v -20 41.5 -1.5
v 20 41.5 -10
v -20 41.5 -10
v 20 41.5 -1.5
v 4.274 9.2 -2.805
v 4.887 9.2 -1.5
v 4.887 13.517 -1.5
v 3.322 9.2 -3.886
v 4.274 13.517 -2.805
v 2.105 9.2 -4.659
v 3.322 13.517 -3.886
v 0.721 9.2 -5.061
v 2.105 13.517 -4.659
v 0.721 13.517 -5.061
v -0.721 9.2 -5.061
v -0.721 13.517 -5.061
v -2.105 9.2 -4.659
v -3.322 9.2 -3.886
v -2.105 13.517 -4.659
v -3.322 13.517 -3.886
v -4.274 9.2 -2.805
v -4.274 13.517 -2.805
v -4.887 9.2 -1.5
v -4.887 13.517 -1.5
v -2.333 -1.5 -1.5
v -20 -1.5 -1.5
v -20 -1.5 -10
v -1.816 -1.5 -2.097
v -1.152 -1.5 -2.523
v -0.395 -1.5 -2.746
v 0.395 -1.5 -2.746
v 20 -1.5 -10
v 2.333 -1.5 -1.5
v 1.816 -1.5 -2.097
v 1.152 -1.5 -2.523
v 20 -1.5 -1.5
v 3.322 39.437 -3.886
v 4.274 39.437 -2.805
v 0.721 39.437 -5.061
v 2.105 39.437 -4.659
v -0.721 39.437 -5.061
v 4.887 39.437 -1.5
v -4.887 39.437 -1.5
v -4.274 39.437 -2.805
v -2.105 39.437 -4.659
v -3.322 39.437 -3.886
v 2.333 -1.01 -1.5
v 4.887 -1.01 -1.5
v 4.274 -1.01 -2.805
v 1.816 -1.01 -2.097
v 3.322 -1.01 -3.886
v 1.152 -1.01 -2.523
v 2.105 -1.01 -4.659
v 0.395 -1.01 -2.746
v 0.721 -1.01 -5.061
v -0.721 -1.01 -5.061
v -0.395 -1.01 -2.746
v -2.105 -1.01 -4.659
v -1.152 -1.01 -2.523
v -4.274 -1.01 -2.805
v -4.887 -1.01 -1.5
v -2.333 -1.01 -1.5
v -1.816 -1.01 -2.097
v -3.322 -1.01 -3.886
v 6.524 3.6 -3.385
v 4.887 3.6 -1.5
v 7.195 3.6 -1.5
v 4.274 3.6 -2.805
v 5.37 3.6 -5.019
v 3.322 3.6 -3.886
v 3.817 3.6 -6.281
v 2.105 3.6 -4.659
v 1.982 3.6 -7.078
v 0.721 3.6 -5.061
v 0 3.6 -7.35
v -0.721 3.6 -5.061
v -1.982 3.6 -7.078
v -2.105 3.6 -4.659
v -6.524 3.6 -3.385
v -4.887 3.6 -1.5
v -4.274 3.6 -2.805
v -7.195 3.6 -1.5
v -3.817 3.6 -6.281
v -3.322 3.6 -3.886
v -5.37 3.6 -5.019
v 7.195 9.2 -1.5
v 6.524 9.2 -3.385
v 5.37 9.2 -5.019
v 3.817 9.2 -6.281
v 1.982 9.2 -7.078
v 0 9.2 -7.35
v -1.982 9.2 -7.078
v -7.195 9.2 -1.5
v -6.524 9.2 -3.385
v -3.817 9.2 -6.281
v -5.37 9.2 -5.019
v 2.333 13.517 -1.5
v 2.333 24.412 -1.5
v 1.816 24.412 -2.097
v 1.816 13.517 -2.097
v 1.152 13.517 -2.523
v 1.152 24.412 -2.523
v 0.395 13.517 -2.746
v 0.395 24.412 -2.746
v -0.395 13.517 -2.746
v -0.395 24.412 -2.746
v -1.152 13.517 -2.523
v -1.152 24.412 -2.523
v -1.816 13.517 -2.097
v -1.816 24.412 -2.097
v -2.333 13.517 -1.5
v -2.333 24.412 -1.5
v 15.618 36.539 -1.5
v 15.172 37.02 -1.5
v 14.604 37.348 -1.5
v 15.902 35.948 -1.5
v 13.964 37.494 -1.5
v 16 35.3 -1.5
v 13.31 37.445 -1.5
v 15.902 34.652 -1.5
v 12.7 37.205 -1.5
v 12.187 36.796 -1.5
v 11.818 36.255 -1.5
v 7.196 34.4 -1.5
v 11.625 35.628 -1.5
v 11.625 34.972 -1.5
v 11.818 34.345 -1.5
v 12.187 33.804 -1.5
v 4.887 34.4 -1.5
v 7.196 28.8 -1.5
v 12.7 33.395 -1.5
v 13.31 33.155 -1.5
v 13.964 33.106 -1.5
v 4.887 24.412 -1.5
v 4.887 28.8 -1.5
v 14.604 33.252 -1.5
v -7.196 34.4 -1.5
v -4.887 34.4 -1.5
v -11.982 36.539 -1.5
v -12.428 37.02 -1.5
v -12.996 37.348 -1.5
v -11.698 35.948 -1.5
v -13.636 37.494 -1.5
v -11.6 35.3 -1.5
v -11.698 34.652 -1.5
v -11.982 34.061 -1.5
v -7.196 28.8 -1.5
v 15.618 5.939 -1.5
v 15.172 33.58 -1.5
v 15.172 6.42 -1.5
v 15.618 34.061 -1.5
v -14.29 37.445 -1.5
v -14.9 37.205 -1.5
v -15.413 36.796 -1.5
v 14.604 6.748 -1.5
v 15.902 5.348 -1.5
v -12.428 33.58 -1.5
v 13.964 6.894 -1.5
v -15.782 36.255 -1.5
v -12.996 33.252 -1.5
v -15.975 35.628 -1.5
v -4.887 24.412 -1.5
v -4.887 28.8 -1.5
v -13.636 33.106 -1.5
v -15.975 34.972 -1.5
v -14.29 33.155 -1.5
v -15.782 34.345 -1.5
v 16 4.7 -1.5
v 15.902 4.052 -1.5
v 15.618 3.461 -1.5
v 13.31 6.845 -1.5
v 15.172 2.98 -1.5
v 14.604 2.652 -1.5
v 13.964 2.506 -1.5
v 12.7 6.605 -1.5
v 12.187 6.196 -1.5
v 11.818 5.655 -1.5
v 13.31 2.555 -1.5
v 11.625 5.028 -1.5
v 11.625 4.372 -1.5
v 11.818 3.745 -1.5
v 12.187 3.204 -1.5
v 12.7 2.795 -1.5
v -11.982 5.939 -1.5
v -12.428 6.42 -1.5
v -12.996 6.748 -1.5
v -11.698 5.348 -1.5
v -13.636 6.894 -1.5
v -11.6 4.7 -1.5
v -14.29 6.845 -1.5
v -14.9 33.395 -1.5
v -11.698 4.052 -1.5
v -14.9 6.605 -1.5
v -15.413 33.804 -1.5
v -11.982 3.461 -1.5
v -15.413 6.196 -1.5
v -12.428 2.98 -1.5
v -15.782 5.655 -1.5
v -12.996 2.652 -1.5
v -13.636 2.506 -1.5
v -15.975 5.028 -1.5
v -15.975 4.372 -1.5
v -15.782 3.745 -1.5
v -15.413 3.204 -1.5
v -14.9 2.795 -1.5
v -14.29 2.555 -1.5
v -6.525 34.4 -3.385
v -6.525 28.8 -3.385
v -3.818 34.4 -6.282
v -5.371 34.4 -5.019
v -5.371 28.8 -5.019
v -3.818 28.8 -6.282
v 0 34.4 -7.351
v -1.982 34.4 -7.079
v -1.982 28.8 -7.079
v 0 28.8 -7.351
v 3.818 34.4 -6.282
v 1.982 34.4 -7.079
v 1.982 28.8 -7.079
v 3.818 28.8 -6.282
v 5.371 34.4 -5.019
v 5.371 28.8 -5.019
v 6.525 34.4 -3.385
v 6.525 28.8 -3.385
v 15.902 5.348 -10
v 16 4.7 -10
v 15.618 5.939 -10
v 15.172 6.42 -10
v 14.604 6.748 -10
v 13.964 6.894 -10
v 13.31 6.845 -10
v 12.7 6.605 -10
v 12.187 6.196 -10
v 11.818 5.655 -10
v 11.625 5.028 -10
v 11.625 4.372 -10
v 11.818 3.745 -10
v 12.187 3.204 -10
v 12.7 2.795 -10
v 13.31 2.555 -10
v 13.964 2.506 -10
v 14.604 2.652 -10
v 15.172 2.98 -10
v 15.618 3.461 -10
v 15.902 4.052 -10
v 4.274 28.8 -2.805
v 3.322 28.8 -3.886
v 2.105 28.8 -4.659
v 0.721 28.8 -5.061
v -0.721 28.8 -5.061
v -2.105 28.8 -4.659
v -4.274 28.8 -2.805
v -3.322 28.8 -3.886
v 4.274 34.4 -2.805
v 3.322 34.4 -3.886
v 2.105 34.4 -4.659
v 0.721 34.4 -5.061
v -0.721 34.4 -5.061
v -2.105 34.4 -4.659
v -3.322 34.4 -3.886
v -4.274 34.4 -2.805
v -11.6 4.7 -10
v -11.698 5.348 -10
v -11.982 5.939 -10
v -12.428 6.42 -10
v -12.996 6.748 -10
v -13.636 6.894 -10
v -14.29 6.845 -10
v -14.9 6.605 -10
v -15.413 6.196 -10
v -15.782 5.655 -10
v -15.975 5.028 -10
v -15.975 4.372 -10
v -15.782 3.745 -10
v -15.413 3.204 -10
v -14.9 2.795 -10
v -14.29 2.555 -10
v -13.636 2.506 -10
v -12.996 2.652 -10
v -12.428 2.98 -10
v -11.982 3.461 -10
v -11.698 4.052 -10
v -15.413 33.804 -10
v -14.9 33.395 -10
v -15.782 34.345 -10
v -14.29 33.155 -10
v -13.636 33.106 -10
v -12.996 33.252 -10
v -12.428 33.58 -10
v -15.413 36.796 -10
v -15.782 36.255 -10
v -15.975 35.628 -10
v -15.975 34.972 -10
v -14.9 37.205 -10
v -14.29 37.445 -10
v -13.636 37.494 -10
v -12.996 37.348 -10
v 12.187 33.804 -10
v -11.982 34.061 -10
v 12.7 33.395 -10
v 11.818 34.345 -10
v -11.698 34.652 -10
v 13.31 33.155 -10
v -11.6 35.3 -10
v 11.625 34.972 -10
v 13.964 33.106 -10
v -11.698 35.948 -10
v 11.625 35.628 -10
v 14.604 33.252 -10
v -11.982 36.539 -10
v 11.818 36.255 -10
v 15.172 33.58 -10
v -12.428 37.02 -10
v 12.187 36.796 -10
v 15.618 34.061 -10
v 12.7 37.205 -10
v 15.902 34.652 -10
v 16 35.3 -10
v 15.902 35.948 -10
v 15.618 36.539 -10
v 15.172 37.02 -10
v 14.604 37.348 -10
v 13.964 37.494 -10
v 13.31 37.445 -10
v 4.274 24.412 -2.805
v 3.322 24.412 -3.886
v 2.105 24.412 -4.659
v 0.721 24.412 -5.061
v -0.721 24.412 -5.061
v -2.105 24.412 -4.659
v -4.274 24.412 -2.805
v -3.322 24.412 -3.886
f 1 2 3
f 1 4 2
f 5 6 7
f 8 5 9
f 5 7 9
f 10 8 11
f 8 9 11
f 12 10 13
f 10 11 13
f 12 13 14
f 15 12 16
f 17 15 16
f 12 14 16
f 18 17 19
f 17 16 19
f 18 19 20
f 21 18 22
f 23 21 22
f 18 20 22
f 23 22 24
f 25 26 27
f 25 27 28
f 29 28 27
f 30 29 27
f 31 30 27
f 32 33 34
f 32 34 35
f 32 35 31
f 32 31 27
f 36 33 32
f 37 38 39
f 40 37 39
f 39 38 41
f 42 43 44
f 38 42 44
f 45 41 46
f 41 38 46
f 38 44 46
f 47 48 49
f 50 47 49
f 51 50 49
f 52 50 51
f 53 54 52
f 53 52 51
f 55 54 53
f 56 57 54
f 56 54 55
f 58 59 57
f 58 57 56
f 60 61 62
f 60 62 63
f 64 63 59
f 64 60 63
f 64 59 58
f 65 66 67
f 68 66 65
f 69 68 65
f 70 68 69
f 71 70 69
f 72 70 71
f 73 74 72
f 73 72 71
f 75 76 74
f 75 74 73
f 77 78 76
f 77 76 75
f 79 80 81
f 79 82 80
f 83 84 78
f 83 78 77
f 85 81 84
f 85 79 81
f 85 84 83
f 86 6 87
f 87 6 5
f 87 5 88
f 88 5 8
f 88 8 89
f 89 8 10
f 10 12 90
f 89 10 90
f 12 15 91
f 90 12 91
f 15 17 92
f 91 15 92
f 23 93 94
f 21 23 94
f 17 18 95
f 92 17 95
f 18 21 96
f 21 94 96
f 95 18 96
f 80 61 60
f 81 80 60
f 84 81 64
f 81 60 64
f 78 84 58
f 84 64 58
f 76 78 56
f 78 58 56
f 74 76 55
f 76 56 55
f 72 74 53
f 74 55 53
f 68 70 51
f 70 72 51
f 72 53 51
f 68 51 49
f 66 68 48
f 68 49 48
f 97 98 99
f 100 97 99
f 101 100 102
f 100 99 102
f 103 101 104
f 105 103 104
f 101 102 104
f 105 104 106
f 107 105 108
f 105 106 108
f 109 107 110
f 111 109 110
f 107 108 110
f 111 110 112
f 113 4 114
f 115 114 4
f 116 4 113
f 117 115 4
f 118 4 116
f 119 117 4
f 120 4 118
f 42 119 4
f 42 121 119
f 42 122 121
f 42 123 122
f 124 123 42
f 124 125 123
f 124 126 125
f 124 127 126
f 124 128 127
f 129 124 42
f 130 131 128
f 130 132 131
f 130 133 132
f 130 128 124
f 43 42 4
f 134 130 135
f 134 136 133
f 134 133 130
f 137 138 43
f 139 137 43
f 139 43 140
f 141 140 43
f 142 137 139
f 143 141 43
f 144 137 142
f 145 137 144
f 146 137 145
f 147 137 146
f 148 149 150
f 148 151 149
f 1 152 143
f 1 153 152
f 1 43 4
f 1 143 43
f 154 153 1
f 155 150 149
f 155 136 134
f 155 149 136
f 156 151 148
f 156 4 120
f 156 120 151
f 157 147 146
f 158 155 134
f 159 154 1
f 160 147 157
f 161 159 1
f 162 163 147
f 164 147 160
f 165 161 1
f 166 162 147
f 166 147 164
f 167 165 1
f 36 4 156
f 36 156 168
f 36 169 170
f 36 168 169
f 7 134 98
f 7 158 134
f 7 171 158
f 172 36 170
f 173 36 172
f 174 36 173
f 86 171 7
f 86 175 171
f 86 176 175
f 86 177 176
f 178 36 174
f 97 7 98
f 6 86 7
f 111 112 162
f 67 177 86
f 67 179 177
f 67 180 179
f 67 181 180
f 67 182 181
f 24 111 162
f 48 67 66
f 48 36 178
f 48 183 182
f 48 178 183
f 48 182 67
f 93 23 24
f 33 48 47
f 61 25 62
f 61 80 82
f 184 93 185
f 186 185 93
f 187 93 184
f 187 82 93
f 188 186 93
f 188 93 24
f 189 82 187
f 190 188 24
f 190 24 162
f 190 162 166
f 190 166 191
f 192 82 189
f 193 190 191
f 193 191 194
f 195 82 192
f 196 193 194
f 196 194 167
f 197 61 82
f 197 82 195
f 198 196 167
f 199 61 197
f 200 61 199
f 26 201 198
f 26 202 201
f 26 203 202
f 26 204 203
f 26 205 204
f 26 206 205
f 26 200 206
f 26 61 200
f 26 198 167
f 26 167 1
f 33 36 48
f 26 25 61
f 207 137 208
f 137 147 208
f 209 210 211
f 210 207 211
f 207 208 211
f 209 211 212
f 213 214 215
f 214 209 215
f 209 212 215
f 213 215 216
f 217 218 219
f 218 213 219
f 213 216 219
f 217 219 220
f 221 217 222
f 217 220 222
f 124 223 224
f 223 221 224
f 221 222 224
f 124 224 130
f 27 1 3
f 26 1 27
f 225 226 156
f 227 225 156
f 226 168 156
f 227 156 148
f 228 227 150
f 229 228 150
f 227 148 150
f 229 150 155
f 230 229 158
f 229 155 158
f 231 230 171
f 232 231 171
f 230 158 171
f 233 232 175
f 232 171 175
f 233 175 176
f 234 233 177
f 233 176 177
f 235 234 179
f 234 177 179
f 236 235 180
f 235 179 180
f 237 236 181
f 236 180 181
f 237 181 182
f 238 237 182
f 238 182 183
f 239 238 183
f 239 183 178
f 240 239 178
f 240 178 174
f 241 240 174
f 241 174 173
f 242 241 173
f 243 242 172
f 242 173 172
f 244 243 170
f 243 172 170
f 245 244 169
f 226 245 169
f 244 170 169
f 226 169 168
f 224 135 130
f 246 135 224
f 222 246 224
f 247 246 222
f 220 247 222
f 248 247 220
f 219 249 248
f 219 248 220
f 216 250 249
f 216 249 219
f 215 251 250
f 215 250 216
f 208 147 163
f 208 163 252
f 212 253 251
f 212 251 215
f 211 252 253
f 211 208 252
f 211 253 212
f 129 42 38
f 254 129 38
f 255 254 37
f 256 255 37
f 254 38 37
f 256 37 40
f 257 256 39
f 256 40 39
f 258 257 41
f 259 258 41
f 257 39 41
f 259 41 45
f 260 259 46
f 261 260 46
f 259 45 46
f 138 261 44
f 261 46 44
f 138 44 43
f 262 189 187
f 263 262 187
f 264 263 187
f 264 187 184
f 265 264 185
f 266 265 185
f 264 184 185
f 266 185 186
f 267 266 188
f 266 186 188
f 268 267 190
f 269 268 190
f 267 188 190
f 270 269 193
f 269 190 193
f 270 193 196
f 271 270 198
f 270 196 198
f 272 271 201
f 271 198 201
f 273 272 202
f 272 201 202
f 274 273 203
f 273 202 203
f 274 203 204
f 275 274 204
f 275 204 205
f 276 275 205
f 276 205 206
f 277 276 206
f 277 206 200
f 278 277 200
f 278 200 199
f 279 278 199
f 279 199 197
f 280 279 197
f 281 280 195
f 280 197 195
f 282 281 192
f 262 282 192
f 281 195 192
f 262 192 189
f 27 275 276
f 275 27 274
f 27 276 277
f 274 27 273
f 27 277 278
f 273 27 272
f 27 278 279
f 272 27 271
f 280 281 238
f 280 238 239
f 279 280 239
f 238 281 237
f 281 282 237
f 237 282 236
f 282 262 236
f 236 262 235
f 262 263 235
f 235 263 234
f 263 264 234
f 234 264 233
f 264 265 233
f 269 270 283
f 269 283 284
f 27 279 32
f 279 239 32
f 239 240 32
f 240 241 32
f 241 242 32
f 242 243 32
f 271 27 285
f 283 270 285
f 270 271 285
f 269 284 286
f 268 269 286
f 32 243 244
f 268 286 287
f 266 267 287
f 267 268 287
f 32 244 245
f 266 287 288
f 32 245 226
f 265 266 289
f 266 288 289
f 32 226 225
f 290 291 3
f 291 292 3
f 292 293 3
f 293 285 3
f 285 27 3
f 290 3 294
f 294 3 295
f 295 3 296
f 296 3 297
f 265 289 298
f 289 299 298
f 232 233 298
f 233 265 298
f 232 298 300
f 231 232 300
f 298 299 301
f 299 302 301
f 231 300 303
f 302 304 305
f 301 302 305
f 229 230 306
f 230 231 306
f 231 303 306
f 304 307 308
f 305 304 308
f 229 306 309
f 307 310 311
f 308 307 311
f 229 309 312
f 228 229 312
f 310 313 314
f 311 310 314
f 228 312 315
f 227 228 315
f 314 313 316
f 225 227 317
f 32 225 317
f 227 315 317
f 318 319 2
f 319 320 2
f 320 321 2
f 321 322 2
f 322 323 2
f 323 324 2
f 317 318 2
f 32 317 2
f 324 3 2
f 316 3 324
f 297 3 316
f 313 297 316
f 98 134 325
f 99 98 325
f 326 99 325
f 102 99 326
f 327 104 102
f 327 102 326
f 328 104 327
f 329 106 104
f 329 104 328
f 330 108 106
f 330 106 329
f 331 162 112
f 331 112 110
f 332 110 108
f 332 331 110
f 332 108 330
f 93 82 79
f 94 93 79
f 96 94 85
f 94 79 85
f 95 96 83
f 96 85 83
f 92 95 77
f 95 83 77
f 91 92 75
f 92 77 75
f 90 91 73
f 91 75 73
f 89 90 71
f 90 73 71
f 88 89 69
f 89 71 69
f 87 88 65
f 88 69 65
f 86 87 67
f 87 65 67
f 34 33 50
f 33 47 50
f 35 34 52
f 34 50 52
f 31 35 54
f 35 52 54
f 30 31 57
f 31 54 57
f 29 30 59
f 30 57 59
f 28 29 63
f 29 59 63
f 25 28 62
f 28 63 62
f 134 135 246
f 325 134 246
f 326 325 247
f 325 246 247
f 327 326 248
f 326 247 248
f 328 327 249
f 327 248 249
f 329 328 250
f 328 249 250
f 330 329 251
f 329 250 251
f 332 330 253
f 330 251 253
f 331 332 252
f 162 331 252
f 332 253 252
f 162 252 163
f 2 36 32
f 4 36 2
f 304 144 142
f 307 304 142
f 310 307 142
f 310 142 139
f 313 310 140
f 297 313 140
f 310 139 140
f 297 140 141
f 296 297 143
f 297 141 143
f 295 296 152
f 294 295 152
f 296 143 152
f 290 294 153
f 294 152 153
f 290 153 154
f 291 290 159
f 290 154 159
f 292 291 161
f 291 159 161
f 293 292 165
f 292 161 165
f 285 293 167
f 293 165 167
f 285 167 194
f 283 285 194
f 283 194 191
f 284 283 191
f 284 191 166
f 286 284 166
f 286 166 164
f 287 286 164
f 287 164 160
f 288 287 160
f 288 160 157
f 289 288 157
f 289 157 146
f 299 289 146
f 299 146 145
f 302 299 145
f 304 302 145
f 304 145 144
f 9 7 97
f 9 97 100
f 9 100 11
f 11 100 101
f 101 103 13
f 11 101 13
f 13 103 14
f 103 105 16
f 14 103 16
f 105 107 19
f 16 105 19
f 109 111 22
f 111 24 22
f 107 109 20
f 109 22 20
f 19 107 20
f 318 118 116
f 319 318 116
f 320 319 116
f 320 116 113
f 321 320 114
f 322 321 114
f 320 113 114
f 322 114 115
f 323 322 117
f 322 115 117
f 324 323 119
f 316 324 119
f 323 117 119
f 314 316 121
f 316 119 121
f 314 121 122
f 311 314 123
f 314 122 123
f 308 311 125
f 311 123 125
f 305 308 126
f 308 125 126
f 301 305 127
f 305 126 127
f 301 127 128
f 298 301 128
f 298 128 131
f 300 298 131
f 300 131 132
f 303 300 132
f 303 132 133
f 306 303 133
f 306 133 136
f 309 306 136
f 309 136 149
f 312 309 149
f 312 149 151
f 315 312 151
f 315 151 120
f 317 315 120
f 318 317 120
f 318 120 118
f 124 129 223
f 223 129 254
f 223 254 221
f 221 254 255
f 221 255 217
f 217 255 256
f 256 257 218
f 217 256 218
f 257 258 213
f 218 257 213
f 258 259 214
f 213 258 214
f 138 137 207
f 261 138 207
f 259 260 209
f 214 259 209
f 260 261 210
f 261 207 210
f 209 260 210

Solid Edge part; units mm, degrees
sketch "Sketch1" plane through (0, 0, 0) normal (0, 0, 1) x (1, 0, 0)
  circle A0 centre (-13.8, 35.3) radius 2.2
  circle A1 centre (-13.8, 4.7) radius 2.2
  circle A2 centre (13.8, 4.7) radius 2.2
  circle A3 centre (13.8, 35.3) radius 2.2
  line L0 (-20, -1.5) -> (20, -1.5)
  line L1 (20, -1.5) -> (20, 41.5)
  line L2 (20, 41.5) -> (-20, 41.5)
  line L3 (-20, 41.5) -> (-20, -1.5)
  dimension "D1" = 43
  dimension "D2" = 40
  dimension "D3" = 20
  dimension "D4" = 4
  dimension "D5" = 4.4
  dimension "D6" = 4
  dimension "D7" = 4
  dimension "D8" = 29.8
  dimension "D9" = 4
extrude "Protrusion1" add sketch "Sketch1" against normal blind 10
sketch "Sketch2" plane through (0, 0, 0) normal (1, 0, 0) x (0, 1, 0)
  line L0 (3.9, -7.35) -> (8.9, -7.35)
  line L1 (3.9, -7.35) -> (3.6, -7.35)
  line L2 (3.6, -7.35) -> (3.6, -5.1123)
  line L3 (2.721, -5.1123) -> (3.6, -5.1123)
  line L4 (2.721, -5.1123) -> (-1.0103, -5.1123)
  line L5 (-1.0103, -5.1123) -> (-1.0103, -3.9681)
  line L6 (-1.0103, -2.774) -> (-1.0103, -3.9681)
  line L7 (-12.5526, -2.774) -> (-1.0103, -2.774)
  line L8 (-12.5526, 0) -> (-12.5526, -2.774)
  line L9 (39.4373, 0) -> (-12.5526, 0)
  line L10 (39.4373, -5.1123) -> (39.4373, 0)
  line L11 (38.3428, -5.1123) -> (39.4373, -5.1123)
  line L12 (34.6612, -5.1123) -> (38.3428, -5.1123)
  line L13 (34.4, -5.1123) -> (34.6612, -5.1123)
  line L14 (34.4, -7.3511) -> (34.4, -5.1123)
  line L15 (29.1, -7.3511) -> (34.4, -7.3511)
  line L16 (29.1, -7.3511) -> (28.8, -7.3511)
  line L17 (28.8, -7.3511) -> (28.8, -5.1123)
  line L18 (24.4125, -5.1123) -> (28.8, -5.1123)
  line L19 (24.4125, -2.774) -> (24.4125, -5.1123)
  line L20 (13.517, -2.774) -> (24.4125, -2.774)
  line L21 (13.517, -5.1123) -> (13.517, -2.774)
  line L22 (10.0842, -5.1123) -> (13.517, -5.1123)
  line L23 (9.2, -5.1123) -> (10.0842, -5.1123)
  line L24 (9.2, -7.35) -> (9.2, -5.1123)
  line L25 (8.9, -7.35) -> (9.2, -7.35)
  dimension "D1" = 5
  dimension "D2" = 0.3
  dimension "D3" = 0.3
  dimension "D4" = 0.3
  dimension "D5" = 0.3
  dimension "D6" = 7.3511
  dimension "D7" = 7.35
revolve "RevolvedCutout1" cut sketch "Sketch2" angle 360 about axis through (0, -60, 0) along (0, 1, 0)
sketch "Sketch3" plane through (0, -1.5, -5) normal (0, -1, 0) x (1, 0, 0)
  line L0 (-23.1839, 5) -> (21.8988, 5)
  line L1 (21.8988, 5) -> (21.8988, 3.5)
  line L2 (21.8988, 3.5) -> (-23.1839, 3.5)
  line L3 (-23.1839, 3.5) -> (-23.1839, 5)
  dimension "D1" = 1.5
extrude "ExtrudedCutout_2" cut sketch "Sketch3" against normal blind 318.8634
